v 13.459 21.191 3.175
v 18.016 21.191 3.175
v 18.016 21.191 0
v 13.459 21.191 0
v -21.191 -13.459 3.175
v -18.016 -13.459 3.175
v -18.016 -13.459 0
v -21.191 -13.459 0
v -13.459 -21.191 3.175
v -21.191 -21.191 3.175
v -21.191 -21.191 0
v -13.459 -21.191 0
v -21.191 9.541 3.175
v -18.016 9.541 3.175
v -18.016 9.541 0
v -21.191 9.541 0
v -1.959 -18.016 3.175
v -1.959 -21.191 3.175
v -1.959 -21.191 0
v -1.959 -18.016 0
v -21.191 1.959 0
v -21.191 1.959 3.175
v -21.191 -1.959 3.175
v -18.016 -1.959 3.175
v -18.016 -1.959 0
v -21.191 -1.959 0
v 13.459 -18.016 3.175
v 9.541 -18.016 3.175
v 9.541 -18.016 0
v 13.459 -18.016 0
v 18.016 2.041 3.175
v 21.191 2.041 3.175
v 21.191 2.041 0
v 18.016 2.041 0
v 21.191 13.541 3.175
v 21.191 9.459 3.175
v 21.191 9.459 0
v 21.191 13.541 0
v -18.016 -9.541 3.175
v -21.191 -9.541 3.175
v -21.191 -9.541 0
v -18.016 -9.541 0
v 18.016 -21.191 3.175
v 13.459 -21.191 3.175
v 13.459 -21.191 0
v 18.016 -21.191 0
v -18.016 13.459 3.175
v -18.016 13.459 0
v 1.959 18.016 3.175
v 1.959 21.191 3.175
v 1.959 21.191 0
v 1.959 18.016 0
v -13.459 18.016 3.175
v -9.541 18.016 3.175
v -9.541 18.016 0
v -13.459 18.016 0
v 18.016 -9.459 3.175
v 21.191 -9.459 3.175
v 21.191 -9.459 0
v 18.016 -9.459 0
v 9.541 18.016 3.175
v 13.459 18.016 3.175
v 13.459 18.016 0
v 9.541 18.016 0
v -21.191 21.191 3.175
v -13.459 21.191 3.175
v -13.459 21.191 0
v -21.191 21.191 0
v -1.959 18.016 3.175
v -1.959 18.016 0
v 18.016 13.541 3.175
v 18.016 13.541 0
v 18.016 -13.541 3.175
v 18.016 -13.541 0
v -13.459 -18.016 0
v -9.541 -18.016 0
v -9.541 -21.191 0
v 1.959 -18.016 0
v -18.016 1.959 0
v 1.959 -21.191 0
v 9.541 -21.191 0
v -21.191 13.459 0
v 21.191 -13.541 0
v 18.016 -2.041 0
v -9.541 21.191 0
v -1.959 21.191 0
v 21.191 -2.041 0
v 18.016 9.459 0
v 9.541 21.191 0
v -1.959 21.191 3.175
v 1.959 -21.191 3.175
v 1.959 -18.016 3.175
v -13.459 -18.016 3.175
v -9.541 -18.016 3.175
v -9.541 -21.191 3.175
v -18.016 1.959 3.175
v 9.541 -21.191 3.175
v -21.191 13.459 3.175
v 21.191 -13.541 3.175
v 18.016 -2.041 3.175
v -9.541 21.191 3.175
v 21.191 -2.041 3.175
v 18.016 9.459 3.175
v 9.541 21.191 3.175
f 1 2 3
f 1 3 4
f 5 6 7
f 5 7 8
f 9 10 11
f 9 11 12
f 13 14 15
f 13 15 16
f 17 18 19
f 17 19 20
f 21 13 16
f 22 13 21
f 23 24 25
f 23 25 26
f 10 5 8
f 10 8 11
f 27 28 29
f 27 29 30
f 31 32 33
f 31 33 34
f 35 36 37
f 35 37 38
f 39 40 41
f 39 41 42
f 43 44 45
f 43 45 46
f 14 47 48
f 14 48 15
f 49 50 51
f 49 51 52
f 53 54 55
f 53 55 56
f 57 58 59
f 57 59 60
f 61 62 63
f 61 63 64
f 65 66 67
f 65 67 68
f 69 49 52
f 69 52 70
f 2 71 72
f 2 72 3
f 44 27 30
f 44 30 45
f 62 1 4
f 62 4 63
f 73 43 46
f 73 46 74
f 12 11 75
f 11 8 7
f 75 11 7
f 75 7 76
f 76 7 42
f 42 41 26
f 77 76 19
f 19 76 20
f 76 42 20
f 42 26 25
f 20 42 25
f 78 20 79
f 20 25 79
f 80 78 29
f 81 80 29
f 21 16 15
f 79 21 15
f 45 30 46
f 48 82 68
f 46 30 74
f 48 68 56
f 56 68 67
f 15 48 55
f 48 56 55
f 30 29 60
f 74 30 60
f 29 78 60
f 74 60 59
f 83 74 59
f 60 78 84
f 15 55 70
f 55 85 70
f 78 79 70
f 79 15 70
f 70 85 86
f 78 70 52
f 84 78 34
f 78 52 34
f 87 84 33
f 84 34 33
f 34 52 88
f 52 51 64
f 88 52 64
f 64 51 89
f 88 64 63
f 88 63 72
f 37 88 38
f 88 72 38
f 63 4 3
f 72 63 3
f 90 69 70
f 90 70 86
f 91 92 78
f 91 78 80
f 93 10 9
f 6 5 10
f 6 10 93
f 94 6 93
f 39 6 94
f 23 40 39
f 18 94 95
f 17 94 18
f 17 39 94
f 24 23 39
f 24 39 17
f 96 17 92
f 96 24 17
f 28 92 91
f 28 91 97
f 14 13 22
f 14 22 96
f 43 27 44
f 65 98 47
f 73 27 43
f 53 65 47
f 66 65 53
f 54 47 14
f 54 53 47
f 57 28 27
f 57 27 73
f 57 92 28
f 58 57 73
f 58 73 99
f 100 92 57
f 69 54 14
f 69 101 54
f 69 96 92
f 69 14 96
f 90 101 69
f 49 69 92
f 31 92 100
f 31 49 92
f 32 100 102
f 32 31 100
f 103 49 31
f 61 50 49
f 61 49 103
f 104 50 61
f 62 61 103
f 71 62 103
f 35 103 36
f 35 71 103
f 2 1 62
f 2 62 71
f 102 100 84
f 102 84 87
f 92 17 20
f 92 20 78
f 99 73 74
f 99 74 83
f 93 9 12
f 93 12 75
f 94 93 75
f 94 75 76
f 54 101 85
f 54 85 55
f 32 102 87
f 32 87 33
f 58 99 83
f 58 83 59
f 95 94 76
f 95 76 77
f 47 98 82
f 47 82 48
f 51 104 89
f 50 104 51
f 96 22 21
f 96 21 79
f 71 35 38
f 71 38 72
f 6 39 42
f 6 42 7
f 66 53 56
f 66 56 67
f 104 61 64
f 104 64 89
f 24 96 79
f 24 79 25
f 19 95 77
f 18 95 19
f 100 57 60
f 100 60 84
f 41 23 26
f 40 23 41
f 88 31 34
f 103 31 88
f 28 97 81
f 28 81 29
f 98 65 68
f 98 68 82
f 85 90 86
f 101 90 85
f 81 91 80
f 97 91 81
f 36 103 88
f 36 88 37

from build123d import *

# Parameters (mm, degrees)
BOSS_EXTRUDE1_DEPTH = 3.175
BOSS_EXTRUDE2_DEPTH = 3.175


with BuildPart() as part:
    # Sketch2 → Boss-Extrude1 (new body)
    with BuildSketch(Plane.XY):
        Polygon((-2, 17.975), (-2, 21.15), (-9.5, 21.15), (-9.5, 17.975), (-13.5, 17.975), (-13.5, 21.15), (-21.15, 21.15), (-21.15, 13.5), (-17.975, 13.5), (-17.975, 9.5), (-21.15, 9.5), (-21.15, 2), (-17.975, 2), (-17.975, -2), (-21.15, -2), (-21.15, -9.5), (-17.975, -9.5), (-17.975, -13.5), (-21.15, -13.5), (-21.15, -21.15), (-13.5, -21.15), (-13.5, -17.975), (-9.5, -17.975), (-9.5, -21.15), (-2, -21.15), (-2, -17.975), (2, -17.975), (2, -21.15), (9.5, -21.15), (9.5, -17.975), (13.5, -17.975), (13.5, -21.15), (17.975, -21.15), (17.975, -13.5), (21.15, -13.5), (21.15, -9.5), (17.975, -9.5), (17.975, -2), (21.15, -2), (21.15, 2), (17.975, 2), (17.975, 9.5), (21.15, 9.5), (21.15, 13.5), (17.975, 13.5), (17.975, 21.15), (13.5, 21.15), (13.5, 17.975), (9.5, 17.975), (9.5, 21.15), (2, 21.15), (2, 17.975), align=None)
    extrude(amount=BOSS_EXTRUDE1_DEPTH)

    # Sketch3 → Boss-Extrude2 (add)
    with BuildSketch(Plane.XY.offset(3.175)):
        Polygon((18.01564, -2.04064), (21.19064, -2.04064), (21.19064, 2.04064), (18.01564, 2.04064), (18.01564, 9.45936), (21.19064, 9.45936), (21.19064, 13.54064), (18.01564, 13.54064), (18.01564, 21.19064), (13.45936, 21.19064), (13.45936, 18.01564), (9.54064, 18.01564), (9.54064, 21.19064), (1.95936, 21.19064), (1.95936, 18.01564), (-1.95936, 18.01564), (-1.95936, 21.19064), (-9.54064, 21.19064), (-9.54064, 18.01564), (-13.45936, 18.01564), (-13.45936, 21.19064), (-21.19064, 21.19064), (-21.19064, 13.45936), (-18.01564, 13.45936), (-18.01564, 9.54064), (-21.19064, 9.54064), (-21.19064, 1.95936), (-18.01564, 1.95936), (-18.01564, -1.95936), (-21.19064, -1.95936), (-21.19064, -9.54064), (-18.01564, -9.54064), (-18.01564, -13.45936), (-21.19064, -13.45936), (-21.19064, -21.19064), (-13.45936, -21.19064), (-13.45936, -18.01564), (-9.54064, -18.01564), (-9.54064, -21.19064), (-1.95936, -21.19064), (-1.95936, -18.01564), (1.95936, -18.01564), (1.95936, -21.19064), (9.54064, -21.19064), (9.54064, -18.01564), (13.45936, -18.01564), (13.45936, -21.19064), (18.01564, -21.19064), (18.01564, -13.54064), (21.19064, -13.54064), (21.19064, -9.45936), (18.01564, -9.45936), align=None)
    extrude(amount=-BOSS_EXTRUDE2_DEPTH)


solid = part.part
